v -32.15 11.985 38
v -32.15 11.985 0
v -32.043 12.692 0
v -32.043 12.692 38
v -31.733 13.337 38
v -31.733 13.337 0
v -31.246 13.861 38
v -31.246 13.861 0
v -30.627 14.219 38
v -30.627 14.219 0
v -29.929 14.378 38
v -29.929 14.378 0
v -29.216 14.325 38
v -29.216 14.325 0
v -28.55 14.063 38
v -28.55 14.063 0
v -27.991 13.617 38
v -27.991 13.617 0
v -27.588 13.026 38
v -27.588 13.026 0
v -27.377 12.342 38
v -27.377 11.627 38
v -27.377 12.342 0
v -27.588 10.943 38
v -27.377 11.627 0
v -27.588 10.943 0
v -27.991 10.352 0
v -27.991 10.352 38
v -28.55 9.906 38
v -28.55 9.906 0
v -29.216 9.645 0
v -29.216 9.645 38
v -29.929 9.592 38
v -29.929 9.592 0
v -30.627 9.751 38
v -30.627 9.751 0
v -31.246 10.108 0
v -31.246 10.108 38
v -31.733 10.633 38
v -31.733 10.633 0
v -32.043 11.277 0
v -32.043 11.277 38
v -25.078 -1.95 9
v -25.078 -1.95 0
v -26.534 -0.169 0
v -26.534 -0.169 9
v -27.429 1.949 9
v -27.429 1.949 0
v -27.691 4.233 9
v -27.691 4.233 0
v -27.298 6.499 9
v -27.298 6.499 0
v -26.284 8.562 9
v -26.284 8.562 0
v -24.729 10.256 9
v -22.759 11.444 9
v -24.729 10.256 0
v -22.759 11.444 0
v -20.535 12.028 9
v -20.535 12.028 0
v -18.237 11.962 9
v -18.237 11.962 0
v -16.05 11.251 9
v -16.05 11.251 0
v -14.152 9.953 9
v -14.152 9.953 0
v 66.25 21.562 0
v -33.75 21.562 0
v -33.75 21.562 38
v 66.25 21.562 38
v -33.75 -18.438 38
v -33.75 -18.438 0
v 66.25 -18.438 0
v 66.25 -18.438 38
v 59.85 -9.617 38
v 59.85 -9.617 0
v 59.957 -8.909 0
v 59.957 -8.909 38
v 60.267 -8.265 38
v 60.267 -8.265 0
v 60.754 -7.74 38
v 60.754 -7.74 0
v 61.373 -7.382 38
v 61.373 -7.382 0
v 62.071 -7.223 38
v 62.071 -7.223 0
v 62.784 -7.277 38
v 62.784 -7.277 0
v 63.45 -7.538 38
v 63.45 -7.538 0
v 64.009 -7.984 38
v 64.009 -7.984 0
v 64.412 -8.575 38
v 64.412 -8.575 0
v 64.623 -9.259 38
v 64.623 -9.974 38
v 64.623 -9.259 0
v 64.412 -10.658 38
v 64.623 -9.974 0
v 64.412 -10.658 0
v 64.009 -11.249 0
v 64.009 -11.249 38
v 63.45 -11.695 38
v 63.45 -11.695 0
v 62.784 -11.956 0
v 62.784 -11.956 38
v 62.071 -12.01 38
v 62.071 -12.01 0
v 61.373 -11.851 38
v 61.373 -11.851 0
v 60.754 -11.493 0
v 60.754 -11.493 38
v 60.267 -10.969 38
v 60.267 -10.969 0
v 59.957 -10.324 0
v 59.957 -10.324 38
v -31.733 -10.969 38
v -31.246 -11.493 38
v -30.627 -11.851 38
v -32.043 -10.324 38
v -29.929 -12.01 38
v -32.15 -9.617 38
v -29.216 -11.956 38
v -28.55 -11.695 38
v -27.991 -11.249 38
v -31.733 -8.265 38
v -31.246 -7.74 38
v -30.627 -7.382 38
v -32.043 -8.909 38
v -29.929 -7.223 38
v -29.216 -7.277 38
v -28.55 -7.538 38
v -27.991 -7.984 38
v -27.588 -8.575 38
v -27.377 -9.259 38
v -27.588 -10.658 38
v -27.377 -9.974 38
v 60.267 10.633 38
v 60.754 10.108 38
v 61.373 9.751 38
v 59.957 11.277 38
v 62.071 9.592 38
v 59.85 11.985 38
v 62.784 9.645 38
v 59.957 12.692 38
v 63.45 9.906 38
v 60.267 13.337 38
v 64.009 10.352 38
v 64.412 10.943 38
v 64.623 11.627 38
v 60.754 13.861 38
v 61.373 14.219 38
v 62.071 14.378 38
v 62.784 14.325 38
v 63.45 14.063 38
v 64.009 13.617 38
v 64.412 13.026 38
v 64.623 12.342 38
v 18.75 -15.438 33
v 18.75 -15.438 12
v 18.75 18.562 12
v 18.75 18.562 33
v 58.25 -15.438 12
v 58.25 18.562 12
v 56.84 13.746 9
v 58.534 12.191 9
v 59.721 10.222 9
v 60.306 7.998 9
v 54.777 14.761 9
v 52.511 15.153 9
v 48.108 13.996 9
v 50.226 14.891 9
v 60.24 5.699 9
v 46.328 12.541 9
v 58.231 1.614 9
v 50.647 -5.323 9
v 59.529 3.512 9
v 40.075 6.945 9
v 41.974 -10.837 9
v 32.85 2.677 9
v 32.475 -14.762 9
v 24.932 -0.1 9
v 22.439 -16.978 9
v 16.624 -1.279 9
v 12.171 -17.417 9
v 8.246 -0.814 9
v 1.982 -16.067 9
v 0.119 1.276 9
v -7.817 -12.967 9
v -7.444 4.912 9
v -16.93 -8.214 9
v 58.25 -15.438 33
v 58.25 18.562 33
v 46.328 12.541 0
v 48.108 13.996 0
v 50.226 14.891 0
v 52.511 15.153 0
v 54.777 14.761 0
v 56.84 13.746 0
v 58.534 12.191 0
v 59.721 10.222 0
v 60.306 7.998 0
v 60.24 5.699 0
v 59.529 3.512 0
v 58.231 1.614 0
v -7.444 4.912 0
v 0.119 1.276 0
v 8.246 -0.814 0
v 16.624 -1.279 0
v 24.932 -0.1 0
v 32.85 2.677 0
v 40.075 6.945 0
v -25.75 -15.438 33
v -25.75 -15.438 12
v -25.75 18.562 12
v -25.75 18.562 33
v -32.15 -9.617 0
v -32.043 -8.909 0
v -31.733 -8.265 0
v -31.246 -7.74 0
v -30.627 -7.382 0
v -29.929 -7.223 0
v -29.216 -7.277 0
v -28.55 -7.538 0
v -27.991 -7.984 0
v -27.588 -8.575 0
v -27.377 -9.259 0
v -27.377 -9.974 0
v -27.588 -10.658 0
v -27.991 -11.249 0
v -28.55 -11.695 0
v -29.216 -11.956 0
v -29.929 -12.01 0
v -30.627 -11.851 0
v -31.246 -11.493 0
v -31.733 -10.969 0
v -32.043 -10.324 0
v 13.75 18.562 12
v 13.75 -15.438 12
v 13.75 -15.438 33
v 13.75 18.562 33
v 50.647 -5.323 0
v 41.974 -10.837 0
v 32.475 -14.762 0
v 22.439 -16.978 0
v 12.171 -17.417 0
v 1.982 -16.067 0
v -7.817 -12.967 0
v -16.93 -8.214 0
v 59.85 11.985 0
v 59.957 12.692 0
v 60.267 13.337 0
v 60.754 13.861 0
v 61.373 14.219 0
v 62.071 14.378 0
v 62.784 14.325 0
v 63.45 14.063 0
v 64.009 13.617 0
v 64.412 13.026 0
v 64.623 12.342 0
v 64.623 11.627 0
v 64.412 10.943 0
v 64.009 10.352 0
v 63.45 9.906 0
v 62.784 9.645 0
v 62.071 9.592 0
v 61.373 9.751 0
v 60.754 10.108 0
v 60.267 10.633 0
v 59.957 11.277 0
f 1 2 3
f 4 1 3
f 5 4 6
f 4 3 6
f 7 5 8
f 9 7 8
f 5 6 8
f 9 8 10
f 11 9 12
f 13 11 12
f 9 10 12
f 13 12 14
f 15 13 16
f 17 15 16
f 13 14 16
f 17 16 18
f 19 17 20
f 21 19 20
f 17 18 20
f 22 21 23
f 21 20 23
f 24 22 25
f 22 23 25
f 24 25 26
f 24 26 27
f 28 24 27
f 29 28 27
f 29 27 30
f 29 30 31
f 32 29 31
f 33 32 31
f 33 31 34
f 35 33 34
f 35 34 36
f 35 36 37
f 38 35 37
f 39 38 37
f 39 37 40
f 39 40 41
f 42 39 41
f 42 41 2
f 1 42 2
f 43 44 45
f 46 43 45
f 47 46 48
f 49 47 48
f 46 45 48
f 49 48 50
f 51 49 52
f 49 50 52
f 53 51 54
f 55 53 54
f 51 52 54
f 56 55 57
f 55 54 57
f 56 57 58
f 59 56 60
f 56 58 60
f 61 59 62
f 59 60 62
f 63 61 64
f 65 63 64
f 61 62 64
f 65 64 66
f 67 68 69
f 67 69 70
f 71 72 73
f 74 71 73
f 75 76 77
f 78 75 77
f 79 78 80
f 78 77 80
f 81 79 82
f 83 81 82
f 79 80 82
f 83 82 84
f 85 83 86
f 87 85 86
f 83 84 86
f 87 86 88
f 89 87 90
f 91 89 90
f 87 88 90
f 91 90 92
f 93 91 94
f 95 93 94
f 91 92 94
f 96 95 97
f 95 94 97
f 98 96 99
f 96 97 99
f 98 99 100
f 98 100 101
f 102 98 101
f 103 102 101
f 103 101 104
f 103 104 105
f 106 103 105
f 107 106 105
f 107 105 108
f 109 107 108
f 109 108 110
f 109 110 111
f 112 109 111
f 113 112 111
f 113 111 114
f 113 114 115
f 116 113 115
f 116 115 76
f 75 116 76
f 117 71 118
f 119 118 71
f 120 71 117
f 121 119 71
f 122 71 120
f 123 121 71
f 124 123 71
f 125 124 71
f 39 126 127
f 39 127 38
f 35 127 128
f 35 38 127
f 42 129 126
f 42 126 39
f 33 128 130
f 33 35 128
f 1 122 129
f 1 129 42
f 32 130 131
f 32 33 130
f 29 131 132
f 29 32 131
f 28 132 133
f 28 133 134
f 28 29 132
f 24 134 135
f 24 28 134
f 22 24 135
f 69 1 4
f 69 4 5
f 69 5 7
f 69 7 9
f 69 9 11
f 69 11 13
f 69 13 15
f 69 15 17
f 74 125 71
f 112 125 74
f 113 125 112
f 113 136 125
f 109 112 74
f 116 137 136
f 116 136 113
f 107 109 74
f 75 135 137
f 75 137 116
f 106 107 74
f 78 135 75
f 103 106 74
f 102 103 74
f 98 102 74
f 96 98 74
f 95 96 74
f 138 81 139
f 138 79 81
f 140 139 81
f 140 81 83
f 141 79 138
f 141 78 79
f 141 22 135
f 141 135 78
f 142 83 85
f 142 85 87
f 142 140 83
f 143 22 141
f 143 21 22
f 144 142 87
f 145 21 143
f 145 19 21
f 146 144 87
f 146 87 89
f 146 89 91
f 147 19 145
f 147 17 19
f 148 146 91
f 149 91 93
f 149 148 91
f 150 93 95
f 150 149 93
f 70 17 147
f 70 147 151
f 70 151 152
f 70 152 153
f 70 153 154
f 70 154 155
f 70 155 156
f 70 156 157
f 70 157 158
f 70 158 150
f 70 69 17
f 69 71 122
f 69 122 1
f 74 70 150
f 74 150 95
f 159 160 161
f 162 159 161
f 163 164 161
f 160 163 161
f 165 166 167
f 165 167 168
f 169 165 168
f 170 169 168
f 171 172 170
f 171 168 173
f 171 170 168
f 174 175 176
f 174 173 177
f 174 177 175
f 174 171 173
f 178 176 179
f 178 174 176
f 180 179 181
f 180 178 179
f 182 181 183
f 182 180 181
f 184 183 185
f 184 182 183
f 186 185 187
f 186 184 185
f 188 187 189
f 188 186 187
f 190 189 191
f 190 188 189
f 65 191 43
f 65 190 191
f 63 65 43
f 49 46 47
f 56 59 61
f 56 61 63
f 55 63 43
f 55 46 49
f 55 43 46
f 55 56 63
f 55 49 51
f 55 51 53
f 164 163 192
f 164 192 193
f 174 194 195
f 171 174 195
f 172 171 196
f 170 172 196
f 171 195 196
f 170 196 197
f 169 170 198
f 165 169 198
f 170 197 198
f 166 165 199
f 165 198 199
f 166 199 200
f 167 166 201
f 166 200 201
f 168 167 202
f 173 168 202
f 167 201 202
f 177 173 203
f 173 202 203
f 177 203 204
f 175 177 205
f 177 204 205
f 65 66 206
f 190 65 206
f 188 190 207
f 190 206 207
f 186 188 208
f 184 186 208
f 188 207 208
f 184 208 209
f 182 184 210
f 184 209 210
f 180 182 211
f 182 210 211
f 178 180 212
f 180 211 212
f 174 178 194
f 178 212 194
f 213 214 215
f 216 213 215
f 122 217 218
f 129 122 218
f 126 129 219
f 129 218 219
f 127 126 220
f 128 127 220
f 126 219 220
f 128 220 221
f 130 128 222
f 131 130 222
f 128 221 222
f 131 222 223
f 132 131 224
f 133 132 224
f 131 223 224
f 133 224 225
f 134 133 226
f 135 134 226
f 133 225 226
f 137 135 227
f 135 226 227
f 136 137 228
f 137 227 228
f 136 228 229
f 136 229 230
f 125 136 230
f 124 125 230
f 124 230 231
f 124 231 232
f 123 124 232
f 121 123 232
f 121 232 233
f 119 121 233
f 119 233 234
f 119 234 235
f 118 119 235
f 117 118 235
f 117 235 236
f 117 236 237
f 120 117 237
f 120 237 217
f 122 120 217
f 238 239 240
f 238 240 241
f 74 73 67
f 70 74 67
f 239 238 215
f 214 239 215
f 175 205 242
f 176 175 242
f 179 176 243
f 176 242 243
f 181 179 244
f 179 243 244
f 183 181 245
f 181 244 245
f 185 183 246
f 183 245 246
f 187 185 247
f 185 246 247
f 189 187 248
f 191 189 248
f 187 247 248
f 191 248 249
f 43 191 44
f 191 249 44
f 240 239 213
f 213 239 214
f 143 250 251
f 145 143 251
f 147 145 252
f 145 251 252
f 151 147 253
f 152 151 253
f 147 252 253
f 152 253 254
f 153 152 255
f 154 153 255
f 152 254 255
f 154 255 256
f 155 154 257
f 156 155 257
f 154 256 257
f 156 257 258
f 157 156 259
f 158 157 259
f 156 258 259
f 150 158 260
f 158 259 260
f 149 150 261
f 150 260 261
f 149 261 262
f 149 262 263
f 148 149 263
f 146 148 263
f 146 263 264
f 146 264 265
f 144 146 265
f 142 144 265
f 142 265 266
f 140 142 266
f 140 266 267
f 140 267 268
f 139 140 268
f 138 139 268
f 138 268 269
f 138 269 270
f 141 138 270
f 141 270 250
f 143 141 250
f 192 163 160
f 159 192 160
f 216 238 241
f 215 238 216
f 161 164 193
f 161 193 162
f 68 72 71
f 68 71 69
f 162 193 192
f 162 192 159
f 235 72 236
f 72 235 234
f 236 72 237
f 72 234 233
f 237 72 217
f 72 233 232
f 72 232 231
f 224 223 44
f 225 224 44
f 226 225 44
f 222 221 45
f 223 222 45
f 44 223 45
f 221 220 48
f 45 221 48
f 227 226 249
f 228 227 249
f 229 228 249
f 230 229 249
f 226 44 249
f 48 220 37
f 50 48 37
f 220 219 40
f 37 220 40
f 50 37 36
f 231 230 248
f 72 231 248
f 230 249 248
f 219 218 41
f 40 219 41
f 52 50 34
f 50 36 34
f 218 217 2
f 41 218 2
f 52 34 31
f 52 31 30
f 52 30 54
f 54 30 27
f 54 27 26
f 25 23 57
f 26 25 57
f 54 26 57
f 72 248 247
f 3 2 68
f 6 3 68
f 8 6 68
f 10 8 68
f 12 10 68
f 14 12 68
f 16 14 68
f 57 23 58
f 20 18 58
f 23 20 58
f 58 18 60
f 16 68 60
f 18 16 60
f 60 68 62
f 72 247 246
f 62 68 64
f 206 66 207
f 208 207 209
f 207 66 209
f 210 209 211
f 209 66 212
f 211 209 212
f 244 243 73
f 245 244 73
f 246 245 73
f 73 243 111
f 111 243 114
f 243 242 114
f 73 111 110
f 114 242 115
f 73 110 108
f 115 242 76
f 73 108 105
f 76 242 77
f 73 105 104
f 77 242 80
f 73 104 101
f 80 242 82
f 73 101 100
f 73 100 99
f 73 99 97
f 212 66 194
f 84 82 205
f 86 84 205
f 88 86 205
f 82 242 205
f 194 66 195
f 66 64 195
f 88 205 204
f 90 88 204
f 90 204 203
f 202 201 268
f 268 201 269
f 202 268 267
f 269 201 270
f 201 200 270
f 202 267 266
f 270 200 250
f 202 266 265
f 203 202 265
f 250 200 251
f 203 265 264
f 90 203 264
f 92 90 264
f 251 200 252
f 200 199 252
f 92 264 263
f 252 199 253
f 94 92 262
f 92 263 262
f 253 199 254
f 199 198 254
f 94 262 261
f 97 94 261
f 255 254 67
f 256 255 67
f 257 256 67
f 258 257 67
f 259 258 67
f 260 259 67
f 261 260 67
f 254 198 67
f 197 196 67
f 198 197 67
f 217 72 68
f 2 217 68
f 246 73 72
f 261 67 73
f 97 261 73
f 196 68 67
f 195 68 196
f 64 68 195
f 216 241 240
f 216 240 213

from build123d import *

# Parameters (mm, degrees)
SKETCH1_W           = 100
SKETCH1_H           = 40
BOSS_EXTRUDE1_DEPTH = 38
CUT_EXTRUDE2_START  = -12
SKETCH2_W           = 39.5
SKETCH2_H           = 34
CUT_EXTRUDE2_DEPTH  = 21
CUT_EXTRUDE3_DEPTH  = 9
CUT_EXTRUDE4_REACH  = 81.36
SKETCH4_R           = 2.4


with BuildPart() as part:
    # Sketch1 → Boss-Extrude1 (new body)
    with BuildSketch(Plane.XY):
        with Locations((16.25, 1.5625)):
            Rectangle(SKETCH1_W, SKETCH1_H)
    extrude(amount=BOSS_EXTRUDE1_DEPTH)

    # Sketch2 → Cut-Extrude2 (cut)
    with BuildSketch(Plane(origin=(0, 0, 0), x_dir=(-1, 0, 0), z_dir=(0, 0, -1)).offset(CUT_EXTRUDE2_START)):
        with Locations((-38.5, 1.5625)):
            Rectangle(SKETCH2_W, SKETCH2_H)
        with Locations((6, 1.5625)):
            Rectangle(SKETCH2_W, SKETCH2_H)
    extrude(amount=-CUT_EXTRUDE2_DEPTH, mode=Mode.SUBTRACT)

    # Sketch3 → Cut-Extrude3 (cut)
    with BuildSketch(Plane(origin=(-3.362318072, 0, 0), x_dir=(-1, 0, 0), z_dir=(0, 0, -1))):
        with BuildLine():
            ThreePointArc((-61.593370612, 1.614325749), (-20.676836723, -17.421621422), (21.715969185, -1.949710178))
            ThreePointArc((21.715969185, -1.949710178), (22.204299442, 9.465009595), (10.78957967, 9.953339852))
            ThreePointArc((10.78957967, 9.953339852), (-19.986233449, -1.278769909), (-49.690320582, 12.540715264))
            ThreePointArc((-49.690320582, 12.540715264), (-61.105040355, 13.029045522), (-61.593370612, 1.614325749))
        make_face()
    extrude(amount=-CUT_EXTRUDE3_DEPTH, mode=Mode.SUBTRACT)

    # Sketch4 → Cut-Extrude4 (cut, up to next)
    with BuildSketch(Plane(origin=(0, 0, 0), x_dir=(-1, 0, 0), z_dir=(0, 0, -1)), mode=Mode.PRIVATE) as cut_extrude4_sk1:
        with Locations((-62.25, 11.98479819)):
            Circle(SKETCH4_R)
    cut_extrude4_tool1 = extrude(cut_extrude4_sk1.sketch, amount=-CUT_EXTRUDE4_REACH, mode=Mode.PRIVATE) & part.part
    # Sketch4 → Cut-Extrude4 (cut, up to next)
    with BuildSketch(Plane(origin=(0, 0, 0), x_dir=(-1, 0, 0), z_dir=(0, 0, -1)), mode=Mode.PRIVATE) as cut_extrude4_sk2:
        with Locations((-62.25, -9.616561755)):
            Circle(SKETCH4_R)
    cut_extrude4_tool2 = extrude(cut_extrude4_sk2.sketch, amount=-CUT_EXTRUDE4_REACH, mode=Mode.PRIVATE) & part.part
    # Sketch4 → Cut-Extrude4 (cut, up to next)
    with BuildSketch(Plane(origin=(0, 0, 0), x_dir=(-1, 0, 0), z_dir=(0, 0, -1)), mode=Mode.PRIVATE) as cut_extrude4_sk3:
        with Locations((29.75, 11.98479819)):
            Circle(SKETCH4_R)
    cut_extrude4_tool3 = extrude(cut_extrude4_sk3.sketch, amount=-CUT_EXTRUDE4_REACH, mode=Mode.PRIVATE) & part.part
    # Sketch4 → Cut-Extrude4 (cut, up to next)
    with BuildSketch(Plane(origin=(0, 0, 0), x_dir=(-1, 0, 0), z_dir=(0, 0, -1)), mode=Mode.PRIVATE) as cut_extrude4_sk4:
        with Locations((29.75, -9.616561755)):
            Circle(SKETCH4_R)
    cut_extrude4_tool4 = extrude(cut_extrude4_sk4.sketch, amount=-CUT_EXTRUDE4_REACH, mode=Mode.PRIVATE) & part.part
    add(cut_extrude4_tool1.solids().sort_by_distance((62.25, 11.984798, 0))[0], mode=Mode.SUBTRACT)
    add(cut_extrude4_tool2.solids().sort_by_distance((62.25, -9.616562, 0))[0], mode=Mode.SUBTRACT)
    add(cut_extrude4_tool3.solids().sort_by_distance((-29.75, 11.984798, 0))[0], mode=Mode.SUBTRACT)
    add(cut_extrude4_tool4.solids().sort_by_distance((-29.75, -9.616562, 0))[0], mode=Mode.SUBTRACT)


solid = part.part
